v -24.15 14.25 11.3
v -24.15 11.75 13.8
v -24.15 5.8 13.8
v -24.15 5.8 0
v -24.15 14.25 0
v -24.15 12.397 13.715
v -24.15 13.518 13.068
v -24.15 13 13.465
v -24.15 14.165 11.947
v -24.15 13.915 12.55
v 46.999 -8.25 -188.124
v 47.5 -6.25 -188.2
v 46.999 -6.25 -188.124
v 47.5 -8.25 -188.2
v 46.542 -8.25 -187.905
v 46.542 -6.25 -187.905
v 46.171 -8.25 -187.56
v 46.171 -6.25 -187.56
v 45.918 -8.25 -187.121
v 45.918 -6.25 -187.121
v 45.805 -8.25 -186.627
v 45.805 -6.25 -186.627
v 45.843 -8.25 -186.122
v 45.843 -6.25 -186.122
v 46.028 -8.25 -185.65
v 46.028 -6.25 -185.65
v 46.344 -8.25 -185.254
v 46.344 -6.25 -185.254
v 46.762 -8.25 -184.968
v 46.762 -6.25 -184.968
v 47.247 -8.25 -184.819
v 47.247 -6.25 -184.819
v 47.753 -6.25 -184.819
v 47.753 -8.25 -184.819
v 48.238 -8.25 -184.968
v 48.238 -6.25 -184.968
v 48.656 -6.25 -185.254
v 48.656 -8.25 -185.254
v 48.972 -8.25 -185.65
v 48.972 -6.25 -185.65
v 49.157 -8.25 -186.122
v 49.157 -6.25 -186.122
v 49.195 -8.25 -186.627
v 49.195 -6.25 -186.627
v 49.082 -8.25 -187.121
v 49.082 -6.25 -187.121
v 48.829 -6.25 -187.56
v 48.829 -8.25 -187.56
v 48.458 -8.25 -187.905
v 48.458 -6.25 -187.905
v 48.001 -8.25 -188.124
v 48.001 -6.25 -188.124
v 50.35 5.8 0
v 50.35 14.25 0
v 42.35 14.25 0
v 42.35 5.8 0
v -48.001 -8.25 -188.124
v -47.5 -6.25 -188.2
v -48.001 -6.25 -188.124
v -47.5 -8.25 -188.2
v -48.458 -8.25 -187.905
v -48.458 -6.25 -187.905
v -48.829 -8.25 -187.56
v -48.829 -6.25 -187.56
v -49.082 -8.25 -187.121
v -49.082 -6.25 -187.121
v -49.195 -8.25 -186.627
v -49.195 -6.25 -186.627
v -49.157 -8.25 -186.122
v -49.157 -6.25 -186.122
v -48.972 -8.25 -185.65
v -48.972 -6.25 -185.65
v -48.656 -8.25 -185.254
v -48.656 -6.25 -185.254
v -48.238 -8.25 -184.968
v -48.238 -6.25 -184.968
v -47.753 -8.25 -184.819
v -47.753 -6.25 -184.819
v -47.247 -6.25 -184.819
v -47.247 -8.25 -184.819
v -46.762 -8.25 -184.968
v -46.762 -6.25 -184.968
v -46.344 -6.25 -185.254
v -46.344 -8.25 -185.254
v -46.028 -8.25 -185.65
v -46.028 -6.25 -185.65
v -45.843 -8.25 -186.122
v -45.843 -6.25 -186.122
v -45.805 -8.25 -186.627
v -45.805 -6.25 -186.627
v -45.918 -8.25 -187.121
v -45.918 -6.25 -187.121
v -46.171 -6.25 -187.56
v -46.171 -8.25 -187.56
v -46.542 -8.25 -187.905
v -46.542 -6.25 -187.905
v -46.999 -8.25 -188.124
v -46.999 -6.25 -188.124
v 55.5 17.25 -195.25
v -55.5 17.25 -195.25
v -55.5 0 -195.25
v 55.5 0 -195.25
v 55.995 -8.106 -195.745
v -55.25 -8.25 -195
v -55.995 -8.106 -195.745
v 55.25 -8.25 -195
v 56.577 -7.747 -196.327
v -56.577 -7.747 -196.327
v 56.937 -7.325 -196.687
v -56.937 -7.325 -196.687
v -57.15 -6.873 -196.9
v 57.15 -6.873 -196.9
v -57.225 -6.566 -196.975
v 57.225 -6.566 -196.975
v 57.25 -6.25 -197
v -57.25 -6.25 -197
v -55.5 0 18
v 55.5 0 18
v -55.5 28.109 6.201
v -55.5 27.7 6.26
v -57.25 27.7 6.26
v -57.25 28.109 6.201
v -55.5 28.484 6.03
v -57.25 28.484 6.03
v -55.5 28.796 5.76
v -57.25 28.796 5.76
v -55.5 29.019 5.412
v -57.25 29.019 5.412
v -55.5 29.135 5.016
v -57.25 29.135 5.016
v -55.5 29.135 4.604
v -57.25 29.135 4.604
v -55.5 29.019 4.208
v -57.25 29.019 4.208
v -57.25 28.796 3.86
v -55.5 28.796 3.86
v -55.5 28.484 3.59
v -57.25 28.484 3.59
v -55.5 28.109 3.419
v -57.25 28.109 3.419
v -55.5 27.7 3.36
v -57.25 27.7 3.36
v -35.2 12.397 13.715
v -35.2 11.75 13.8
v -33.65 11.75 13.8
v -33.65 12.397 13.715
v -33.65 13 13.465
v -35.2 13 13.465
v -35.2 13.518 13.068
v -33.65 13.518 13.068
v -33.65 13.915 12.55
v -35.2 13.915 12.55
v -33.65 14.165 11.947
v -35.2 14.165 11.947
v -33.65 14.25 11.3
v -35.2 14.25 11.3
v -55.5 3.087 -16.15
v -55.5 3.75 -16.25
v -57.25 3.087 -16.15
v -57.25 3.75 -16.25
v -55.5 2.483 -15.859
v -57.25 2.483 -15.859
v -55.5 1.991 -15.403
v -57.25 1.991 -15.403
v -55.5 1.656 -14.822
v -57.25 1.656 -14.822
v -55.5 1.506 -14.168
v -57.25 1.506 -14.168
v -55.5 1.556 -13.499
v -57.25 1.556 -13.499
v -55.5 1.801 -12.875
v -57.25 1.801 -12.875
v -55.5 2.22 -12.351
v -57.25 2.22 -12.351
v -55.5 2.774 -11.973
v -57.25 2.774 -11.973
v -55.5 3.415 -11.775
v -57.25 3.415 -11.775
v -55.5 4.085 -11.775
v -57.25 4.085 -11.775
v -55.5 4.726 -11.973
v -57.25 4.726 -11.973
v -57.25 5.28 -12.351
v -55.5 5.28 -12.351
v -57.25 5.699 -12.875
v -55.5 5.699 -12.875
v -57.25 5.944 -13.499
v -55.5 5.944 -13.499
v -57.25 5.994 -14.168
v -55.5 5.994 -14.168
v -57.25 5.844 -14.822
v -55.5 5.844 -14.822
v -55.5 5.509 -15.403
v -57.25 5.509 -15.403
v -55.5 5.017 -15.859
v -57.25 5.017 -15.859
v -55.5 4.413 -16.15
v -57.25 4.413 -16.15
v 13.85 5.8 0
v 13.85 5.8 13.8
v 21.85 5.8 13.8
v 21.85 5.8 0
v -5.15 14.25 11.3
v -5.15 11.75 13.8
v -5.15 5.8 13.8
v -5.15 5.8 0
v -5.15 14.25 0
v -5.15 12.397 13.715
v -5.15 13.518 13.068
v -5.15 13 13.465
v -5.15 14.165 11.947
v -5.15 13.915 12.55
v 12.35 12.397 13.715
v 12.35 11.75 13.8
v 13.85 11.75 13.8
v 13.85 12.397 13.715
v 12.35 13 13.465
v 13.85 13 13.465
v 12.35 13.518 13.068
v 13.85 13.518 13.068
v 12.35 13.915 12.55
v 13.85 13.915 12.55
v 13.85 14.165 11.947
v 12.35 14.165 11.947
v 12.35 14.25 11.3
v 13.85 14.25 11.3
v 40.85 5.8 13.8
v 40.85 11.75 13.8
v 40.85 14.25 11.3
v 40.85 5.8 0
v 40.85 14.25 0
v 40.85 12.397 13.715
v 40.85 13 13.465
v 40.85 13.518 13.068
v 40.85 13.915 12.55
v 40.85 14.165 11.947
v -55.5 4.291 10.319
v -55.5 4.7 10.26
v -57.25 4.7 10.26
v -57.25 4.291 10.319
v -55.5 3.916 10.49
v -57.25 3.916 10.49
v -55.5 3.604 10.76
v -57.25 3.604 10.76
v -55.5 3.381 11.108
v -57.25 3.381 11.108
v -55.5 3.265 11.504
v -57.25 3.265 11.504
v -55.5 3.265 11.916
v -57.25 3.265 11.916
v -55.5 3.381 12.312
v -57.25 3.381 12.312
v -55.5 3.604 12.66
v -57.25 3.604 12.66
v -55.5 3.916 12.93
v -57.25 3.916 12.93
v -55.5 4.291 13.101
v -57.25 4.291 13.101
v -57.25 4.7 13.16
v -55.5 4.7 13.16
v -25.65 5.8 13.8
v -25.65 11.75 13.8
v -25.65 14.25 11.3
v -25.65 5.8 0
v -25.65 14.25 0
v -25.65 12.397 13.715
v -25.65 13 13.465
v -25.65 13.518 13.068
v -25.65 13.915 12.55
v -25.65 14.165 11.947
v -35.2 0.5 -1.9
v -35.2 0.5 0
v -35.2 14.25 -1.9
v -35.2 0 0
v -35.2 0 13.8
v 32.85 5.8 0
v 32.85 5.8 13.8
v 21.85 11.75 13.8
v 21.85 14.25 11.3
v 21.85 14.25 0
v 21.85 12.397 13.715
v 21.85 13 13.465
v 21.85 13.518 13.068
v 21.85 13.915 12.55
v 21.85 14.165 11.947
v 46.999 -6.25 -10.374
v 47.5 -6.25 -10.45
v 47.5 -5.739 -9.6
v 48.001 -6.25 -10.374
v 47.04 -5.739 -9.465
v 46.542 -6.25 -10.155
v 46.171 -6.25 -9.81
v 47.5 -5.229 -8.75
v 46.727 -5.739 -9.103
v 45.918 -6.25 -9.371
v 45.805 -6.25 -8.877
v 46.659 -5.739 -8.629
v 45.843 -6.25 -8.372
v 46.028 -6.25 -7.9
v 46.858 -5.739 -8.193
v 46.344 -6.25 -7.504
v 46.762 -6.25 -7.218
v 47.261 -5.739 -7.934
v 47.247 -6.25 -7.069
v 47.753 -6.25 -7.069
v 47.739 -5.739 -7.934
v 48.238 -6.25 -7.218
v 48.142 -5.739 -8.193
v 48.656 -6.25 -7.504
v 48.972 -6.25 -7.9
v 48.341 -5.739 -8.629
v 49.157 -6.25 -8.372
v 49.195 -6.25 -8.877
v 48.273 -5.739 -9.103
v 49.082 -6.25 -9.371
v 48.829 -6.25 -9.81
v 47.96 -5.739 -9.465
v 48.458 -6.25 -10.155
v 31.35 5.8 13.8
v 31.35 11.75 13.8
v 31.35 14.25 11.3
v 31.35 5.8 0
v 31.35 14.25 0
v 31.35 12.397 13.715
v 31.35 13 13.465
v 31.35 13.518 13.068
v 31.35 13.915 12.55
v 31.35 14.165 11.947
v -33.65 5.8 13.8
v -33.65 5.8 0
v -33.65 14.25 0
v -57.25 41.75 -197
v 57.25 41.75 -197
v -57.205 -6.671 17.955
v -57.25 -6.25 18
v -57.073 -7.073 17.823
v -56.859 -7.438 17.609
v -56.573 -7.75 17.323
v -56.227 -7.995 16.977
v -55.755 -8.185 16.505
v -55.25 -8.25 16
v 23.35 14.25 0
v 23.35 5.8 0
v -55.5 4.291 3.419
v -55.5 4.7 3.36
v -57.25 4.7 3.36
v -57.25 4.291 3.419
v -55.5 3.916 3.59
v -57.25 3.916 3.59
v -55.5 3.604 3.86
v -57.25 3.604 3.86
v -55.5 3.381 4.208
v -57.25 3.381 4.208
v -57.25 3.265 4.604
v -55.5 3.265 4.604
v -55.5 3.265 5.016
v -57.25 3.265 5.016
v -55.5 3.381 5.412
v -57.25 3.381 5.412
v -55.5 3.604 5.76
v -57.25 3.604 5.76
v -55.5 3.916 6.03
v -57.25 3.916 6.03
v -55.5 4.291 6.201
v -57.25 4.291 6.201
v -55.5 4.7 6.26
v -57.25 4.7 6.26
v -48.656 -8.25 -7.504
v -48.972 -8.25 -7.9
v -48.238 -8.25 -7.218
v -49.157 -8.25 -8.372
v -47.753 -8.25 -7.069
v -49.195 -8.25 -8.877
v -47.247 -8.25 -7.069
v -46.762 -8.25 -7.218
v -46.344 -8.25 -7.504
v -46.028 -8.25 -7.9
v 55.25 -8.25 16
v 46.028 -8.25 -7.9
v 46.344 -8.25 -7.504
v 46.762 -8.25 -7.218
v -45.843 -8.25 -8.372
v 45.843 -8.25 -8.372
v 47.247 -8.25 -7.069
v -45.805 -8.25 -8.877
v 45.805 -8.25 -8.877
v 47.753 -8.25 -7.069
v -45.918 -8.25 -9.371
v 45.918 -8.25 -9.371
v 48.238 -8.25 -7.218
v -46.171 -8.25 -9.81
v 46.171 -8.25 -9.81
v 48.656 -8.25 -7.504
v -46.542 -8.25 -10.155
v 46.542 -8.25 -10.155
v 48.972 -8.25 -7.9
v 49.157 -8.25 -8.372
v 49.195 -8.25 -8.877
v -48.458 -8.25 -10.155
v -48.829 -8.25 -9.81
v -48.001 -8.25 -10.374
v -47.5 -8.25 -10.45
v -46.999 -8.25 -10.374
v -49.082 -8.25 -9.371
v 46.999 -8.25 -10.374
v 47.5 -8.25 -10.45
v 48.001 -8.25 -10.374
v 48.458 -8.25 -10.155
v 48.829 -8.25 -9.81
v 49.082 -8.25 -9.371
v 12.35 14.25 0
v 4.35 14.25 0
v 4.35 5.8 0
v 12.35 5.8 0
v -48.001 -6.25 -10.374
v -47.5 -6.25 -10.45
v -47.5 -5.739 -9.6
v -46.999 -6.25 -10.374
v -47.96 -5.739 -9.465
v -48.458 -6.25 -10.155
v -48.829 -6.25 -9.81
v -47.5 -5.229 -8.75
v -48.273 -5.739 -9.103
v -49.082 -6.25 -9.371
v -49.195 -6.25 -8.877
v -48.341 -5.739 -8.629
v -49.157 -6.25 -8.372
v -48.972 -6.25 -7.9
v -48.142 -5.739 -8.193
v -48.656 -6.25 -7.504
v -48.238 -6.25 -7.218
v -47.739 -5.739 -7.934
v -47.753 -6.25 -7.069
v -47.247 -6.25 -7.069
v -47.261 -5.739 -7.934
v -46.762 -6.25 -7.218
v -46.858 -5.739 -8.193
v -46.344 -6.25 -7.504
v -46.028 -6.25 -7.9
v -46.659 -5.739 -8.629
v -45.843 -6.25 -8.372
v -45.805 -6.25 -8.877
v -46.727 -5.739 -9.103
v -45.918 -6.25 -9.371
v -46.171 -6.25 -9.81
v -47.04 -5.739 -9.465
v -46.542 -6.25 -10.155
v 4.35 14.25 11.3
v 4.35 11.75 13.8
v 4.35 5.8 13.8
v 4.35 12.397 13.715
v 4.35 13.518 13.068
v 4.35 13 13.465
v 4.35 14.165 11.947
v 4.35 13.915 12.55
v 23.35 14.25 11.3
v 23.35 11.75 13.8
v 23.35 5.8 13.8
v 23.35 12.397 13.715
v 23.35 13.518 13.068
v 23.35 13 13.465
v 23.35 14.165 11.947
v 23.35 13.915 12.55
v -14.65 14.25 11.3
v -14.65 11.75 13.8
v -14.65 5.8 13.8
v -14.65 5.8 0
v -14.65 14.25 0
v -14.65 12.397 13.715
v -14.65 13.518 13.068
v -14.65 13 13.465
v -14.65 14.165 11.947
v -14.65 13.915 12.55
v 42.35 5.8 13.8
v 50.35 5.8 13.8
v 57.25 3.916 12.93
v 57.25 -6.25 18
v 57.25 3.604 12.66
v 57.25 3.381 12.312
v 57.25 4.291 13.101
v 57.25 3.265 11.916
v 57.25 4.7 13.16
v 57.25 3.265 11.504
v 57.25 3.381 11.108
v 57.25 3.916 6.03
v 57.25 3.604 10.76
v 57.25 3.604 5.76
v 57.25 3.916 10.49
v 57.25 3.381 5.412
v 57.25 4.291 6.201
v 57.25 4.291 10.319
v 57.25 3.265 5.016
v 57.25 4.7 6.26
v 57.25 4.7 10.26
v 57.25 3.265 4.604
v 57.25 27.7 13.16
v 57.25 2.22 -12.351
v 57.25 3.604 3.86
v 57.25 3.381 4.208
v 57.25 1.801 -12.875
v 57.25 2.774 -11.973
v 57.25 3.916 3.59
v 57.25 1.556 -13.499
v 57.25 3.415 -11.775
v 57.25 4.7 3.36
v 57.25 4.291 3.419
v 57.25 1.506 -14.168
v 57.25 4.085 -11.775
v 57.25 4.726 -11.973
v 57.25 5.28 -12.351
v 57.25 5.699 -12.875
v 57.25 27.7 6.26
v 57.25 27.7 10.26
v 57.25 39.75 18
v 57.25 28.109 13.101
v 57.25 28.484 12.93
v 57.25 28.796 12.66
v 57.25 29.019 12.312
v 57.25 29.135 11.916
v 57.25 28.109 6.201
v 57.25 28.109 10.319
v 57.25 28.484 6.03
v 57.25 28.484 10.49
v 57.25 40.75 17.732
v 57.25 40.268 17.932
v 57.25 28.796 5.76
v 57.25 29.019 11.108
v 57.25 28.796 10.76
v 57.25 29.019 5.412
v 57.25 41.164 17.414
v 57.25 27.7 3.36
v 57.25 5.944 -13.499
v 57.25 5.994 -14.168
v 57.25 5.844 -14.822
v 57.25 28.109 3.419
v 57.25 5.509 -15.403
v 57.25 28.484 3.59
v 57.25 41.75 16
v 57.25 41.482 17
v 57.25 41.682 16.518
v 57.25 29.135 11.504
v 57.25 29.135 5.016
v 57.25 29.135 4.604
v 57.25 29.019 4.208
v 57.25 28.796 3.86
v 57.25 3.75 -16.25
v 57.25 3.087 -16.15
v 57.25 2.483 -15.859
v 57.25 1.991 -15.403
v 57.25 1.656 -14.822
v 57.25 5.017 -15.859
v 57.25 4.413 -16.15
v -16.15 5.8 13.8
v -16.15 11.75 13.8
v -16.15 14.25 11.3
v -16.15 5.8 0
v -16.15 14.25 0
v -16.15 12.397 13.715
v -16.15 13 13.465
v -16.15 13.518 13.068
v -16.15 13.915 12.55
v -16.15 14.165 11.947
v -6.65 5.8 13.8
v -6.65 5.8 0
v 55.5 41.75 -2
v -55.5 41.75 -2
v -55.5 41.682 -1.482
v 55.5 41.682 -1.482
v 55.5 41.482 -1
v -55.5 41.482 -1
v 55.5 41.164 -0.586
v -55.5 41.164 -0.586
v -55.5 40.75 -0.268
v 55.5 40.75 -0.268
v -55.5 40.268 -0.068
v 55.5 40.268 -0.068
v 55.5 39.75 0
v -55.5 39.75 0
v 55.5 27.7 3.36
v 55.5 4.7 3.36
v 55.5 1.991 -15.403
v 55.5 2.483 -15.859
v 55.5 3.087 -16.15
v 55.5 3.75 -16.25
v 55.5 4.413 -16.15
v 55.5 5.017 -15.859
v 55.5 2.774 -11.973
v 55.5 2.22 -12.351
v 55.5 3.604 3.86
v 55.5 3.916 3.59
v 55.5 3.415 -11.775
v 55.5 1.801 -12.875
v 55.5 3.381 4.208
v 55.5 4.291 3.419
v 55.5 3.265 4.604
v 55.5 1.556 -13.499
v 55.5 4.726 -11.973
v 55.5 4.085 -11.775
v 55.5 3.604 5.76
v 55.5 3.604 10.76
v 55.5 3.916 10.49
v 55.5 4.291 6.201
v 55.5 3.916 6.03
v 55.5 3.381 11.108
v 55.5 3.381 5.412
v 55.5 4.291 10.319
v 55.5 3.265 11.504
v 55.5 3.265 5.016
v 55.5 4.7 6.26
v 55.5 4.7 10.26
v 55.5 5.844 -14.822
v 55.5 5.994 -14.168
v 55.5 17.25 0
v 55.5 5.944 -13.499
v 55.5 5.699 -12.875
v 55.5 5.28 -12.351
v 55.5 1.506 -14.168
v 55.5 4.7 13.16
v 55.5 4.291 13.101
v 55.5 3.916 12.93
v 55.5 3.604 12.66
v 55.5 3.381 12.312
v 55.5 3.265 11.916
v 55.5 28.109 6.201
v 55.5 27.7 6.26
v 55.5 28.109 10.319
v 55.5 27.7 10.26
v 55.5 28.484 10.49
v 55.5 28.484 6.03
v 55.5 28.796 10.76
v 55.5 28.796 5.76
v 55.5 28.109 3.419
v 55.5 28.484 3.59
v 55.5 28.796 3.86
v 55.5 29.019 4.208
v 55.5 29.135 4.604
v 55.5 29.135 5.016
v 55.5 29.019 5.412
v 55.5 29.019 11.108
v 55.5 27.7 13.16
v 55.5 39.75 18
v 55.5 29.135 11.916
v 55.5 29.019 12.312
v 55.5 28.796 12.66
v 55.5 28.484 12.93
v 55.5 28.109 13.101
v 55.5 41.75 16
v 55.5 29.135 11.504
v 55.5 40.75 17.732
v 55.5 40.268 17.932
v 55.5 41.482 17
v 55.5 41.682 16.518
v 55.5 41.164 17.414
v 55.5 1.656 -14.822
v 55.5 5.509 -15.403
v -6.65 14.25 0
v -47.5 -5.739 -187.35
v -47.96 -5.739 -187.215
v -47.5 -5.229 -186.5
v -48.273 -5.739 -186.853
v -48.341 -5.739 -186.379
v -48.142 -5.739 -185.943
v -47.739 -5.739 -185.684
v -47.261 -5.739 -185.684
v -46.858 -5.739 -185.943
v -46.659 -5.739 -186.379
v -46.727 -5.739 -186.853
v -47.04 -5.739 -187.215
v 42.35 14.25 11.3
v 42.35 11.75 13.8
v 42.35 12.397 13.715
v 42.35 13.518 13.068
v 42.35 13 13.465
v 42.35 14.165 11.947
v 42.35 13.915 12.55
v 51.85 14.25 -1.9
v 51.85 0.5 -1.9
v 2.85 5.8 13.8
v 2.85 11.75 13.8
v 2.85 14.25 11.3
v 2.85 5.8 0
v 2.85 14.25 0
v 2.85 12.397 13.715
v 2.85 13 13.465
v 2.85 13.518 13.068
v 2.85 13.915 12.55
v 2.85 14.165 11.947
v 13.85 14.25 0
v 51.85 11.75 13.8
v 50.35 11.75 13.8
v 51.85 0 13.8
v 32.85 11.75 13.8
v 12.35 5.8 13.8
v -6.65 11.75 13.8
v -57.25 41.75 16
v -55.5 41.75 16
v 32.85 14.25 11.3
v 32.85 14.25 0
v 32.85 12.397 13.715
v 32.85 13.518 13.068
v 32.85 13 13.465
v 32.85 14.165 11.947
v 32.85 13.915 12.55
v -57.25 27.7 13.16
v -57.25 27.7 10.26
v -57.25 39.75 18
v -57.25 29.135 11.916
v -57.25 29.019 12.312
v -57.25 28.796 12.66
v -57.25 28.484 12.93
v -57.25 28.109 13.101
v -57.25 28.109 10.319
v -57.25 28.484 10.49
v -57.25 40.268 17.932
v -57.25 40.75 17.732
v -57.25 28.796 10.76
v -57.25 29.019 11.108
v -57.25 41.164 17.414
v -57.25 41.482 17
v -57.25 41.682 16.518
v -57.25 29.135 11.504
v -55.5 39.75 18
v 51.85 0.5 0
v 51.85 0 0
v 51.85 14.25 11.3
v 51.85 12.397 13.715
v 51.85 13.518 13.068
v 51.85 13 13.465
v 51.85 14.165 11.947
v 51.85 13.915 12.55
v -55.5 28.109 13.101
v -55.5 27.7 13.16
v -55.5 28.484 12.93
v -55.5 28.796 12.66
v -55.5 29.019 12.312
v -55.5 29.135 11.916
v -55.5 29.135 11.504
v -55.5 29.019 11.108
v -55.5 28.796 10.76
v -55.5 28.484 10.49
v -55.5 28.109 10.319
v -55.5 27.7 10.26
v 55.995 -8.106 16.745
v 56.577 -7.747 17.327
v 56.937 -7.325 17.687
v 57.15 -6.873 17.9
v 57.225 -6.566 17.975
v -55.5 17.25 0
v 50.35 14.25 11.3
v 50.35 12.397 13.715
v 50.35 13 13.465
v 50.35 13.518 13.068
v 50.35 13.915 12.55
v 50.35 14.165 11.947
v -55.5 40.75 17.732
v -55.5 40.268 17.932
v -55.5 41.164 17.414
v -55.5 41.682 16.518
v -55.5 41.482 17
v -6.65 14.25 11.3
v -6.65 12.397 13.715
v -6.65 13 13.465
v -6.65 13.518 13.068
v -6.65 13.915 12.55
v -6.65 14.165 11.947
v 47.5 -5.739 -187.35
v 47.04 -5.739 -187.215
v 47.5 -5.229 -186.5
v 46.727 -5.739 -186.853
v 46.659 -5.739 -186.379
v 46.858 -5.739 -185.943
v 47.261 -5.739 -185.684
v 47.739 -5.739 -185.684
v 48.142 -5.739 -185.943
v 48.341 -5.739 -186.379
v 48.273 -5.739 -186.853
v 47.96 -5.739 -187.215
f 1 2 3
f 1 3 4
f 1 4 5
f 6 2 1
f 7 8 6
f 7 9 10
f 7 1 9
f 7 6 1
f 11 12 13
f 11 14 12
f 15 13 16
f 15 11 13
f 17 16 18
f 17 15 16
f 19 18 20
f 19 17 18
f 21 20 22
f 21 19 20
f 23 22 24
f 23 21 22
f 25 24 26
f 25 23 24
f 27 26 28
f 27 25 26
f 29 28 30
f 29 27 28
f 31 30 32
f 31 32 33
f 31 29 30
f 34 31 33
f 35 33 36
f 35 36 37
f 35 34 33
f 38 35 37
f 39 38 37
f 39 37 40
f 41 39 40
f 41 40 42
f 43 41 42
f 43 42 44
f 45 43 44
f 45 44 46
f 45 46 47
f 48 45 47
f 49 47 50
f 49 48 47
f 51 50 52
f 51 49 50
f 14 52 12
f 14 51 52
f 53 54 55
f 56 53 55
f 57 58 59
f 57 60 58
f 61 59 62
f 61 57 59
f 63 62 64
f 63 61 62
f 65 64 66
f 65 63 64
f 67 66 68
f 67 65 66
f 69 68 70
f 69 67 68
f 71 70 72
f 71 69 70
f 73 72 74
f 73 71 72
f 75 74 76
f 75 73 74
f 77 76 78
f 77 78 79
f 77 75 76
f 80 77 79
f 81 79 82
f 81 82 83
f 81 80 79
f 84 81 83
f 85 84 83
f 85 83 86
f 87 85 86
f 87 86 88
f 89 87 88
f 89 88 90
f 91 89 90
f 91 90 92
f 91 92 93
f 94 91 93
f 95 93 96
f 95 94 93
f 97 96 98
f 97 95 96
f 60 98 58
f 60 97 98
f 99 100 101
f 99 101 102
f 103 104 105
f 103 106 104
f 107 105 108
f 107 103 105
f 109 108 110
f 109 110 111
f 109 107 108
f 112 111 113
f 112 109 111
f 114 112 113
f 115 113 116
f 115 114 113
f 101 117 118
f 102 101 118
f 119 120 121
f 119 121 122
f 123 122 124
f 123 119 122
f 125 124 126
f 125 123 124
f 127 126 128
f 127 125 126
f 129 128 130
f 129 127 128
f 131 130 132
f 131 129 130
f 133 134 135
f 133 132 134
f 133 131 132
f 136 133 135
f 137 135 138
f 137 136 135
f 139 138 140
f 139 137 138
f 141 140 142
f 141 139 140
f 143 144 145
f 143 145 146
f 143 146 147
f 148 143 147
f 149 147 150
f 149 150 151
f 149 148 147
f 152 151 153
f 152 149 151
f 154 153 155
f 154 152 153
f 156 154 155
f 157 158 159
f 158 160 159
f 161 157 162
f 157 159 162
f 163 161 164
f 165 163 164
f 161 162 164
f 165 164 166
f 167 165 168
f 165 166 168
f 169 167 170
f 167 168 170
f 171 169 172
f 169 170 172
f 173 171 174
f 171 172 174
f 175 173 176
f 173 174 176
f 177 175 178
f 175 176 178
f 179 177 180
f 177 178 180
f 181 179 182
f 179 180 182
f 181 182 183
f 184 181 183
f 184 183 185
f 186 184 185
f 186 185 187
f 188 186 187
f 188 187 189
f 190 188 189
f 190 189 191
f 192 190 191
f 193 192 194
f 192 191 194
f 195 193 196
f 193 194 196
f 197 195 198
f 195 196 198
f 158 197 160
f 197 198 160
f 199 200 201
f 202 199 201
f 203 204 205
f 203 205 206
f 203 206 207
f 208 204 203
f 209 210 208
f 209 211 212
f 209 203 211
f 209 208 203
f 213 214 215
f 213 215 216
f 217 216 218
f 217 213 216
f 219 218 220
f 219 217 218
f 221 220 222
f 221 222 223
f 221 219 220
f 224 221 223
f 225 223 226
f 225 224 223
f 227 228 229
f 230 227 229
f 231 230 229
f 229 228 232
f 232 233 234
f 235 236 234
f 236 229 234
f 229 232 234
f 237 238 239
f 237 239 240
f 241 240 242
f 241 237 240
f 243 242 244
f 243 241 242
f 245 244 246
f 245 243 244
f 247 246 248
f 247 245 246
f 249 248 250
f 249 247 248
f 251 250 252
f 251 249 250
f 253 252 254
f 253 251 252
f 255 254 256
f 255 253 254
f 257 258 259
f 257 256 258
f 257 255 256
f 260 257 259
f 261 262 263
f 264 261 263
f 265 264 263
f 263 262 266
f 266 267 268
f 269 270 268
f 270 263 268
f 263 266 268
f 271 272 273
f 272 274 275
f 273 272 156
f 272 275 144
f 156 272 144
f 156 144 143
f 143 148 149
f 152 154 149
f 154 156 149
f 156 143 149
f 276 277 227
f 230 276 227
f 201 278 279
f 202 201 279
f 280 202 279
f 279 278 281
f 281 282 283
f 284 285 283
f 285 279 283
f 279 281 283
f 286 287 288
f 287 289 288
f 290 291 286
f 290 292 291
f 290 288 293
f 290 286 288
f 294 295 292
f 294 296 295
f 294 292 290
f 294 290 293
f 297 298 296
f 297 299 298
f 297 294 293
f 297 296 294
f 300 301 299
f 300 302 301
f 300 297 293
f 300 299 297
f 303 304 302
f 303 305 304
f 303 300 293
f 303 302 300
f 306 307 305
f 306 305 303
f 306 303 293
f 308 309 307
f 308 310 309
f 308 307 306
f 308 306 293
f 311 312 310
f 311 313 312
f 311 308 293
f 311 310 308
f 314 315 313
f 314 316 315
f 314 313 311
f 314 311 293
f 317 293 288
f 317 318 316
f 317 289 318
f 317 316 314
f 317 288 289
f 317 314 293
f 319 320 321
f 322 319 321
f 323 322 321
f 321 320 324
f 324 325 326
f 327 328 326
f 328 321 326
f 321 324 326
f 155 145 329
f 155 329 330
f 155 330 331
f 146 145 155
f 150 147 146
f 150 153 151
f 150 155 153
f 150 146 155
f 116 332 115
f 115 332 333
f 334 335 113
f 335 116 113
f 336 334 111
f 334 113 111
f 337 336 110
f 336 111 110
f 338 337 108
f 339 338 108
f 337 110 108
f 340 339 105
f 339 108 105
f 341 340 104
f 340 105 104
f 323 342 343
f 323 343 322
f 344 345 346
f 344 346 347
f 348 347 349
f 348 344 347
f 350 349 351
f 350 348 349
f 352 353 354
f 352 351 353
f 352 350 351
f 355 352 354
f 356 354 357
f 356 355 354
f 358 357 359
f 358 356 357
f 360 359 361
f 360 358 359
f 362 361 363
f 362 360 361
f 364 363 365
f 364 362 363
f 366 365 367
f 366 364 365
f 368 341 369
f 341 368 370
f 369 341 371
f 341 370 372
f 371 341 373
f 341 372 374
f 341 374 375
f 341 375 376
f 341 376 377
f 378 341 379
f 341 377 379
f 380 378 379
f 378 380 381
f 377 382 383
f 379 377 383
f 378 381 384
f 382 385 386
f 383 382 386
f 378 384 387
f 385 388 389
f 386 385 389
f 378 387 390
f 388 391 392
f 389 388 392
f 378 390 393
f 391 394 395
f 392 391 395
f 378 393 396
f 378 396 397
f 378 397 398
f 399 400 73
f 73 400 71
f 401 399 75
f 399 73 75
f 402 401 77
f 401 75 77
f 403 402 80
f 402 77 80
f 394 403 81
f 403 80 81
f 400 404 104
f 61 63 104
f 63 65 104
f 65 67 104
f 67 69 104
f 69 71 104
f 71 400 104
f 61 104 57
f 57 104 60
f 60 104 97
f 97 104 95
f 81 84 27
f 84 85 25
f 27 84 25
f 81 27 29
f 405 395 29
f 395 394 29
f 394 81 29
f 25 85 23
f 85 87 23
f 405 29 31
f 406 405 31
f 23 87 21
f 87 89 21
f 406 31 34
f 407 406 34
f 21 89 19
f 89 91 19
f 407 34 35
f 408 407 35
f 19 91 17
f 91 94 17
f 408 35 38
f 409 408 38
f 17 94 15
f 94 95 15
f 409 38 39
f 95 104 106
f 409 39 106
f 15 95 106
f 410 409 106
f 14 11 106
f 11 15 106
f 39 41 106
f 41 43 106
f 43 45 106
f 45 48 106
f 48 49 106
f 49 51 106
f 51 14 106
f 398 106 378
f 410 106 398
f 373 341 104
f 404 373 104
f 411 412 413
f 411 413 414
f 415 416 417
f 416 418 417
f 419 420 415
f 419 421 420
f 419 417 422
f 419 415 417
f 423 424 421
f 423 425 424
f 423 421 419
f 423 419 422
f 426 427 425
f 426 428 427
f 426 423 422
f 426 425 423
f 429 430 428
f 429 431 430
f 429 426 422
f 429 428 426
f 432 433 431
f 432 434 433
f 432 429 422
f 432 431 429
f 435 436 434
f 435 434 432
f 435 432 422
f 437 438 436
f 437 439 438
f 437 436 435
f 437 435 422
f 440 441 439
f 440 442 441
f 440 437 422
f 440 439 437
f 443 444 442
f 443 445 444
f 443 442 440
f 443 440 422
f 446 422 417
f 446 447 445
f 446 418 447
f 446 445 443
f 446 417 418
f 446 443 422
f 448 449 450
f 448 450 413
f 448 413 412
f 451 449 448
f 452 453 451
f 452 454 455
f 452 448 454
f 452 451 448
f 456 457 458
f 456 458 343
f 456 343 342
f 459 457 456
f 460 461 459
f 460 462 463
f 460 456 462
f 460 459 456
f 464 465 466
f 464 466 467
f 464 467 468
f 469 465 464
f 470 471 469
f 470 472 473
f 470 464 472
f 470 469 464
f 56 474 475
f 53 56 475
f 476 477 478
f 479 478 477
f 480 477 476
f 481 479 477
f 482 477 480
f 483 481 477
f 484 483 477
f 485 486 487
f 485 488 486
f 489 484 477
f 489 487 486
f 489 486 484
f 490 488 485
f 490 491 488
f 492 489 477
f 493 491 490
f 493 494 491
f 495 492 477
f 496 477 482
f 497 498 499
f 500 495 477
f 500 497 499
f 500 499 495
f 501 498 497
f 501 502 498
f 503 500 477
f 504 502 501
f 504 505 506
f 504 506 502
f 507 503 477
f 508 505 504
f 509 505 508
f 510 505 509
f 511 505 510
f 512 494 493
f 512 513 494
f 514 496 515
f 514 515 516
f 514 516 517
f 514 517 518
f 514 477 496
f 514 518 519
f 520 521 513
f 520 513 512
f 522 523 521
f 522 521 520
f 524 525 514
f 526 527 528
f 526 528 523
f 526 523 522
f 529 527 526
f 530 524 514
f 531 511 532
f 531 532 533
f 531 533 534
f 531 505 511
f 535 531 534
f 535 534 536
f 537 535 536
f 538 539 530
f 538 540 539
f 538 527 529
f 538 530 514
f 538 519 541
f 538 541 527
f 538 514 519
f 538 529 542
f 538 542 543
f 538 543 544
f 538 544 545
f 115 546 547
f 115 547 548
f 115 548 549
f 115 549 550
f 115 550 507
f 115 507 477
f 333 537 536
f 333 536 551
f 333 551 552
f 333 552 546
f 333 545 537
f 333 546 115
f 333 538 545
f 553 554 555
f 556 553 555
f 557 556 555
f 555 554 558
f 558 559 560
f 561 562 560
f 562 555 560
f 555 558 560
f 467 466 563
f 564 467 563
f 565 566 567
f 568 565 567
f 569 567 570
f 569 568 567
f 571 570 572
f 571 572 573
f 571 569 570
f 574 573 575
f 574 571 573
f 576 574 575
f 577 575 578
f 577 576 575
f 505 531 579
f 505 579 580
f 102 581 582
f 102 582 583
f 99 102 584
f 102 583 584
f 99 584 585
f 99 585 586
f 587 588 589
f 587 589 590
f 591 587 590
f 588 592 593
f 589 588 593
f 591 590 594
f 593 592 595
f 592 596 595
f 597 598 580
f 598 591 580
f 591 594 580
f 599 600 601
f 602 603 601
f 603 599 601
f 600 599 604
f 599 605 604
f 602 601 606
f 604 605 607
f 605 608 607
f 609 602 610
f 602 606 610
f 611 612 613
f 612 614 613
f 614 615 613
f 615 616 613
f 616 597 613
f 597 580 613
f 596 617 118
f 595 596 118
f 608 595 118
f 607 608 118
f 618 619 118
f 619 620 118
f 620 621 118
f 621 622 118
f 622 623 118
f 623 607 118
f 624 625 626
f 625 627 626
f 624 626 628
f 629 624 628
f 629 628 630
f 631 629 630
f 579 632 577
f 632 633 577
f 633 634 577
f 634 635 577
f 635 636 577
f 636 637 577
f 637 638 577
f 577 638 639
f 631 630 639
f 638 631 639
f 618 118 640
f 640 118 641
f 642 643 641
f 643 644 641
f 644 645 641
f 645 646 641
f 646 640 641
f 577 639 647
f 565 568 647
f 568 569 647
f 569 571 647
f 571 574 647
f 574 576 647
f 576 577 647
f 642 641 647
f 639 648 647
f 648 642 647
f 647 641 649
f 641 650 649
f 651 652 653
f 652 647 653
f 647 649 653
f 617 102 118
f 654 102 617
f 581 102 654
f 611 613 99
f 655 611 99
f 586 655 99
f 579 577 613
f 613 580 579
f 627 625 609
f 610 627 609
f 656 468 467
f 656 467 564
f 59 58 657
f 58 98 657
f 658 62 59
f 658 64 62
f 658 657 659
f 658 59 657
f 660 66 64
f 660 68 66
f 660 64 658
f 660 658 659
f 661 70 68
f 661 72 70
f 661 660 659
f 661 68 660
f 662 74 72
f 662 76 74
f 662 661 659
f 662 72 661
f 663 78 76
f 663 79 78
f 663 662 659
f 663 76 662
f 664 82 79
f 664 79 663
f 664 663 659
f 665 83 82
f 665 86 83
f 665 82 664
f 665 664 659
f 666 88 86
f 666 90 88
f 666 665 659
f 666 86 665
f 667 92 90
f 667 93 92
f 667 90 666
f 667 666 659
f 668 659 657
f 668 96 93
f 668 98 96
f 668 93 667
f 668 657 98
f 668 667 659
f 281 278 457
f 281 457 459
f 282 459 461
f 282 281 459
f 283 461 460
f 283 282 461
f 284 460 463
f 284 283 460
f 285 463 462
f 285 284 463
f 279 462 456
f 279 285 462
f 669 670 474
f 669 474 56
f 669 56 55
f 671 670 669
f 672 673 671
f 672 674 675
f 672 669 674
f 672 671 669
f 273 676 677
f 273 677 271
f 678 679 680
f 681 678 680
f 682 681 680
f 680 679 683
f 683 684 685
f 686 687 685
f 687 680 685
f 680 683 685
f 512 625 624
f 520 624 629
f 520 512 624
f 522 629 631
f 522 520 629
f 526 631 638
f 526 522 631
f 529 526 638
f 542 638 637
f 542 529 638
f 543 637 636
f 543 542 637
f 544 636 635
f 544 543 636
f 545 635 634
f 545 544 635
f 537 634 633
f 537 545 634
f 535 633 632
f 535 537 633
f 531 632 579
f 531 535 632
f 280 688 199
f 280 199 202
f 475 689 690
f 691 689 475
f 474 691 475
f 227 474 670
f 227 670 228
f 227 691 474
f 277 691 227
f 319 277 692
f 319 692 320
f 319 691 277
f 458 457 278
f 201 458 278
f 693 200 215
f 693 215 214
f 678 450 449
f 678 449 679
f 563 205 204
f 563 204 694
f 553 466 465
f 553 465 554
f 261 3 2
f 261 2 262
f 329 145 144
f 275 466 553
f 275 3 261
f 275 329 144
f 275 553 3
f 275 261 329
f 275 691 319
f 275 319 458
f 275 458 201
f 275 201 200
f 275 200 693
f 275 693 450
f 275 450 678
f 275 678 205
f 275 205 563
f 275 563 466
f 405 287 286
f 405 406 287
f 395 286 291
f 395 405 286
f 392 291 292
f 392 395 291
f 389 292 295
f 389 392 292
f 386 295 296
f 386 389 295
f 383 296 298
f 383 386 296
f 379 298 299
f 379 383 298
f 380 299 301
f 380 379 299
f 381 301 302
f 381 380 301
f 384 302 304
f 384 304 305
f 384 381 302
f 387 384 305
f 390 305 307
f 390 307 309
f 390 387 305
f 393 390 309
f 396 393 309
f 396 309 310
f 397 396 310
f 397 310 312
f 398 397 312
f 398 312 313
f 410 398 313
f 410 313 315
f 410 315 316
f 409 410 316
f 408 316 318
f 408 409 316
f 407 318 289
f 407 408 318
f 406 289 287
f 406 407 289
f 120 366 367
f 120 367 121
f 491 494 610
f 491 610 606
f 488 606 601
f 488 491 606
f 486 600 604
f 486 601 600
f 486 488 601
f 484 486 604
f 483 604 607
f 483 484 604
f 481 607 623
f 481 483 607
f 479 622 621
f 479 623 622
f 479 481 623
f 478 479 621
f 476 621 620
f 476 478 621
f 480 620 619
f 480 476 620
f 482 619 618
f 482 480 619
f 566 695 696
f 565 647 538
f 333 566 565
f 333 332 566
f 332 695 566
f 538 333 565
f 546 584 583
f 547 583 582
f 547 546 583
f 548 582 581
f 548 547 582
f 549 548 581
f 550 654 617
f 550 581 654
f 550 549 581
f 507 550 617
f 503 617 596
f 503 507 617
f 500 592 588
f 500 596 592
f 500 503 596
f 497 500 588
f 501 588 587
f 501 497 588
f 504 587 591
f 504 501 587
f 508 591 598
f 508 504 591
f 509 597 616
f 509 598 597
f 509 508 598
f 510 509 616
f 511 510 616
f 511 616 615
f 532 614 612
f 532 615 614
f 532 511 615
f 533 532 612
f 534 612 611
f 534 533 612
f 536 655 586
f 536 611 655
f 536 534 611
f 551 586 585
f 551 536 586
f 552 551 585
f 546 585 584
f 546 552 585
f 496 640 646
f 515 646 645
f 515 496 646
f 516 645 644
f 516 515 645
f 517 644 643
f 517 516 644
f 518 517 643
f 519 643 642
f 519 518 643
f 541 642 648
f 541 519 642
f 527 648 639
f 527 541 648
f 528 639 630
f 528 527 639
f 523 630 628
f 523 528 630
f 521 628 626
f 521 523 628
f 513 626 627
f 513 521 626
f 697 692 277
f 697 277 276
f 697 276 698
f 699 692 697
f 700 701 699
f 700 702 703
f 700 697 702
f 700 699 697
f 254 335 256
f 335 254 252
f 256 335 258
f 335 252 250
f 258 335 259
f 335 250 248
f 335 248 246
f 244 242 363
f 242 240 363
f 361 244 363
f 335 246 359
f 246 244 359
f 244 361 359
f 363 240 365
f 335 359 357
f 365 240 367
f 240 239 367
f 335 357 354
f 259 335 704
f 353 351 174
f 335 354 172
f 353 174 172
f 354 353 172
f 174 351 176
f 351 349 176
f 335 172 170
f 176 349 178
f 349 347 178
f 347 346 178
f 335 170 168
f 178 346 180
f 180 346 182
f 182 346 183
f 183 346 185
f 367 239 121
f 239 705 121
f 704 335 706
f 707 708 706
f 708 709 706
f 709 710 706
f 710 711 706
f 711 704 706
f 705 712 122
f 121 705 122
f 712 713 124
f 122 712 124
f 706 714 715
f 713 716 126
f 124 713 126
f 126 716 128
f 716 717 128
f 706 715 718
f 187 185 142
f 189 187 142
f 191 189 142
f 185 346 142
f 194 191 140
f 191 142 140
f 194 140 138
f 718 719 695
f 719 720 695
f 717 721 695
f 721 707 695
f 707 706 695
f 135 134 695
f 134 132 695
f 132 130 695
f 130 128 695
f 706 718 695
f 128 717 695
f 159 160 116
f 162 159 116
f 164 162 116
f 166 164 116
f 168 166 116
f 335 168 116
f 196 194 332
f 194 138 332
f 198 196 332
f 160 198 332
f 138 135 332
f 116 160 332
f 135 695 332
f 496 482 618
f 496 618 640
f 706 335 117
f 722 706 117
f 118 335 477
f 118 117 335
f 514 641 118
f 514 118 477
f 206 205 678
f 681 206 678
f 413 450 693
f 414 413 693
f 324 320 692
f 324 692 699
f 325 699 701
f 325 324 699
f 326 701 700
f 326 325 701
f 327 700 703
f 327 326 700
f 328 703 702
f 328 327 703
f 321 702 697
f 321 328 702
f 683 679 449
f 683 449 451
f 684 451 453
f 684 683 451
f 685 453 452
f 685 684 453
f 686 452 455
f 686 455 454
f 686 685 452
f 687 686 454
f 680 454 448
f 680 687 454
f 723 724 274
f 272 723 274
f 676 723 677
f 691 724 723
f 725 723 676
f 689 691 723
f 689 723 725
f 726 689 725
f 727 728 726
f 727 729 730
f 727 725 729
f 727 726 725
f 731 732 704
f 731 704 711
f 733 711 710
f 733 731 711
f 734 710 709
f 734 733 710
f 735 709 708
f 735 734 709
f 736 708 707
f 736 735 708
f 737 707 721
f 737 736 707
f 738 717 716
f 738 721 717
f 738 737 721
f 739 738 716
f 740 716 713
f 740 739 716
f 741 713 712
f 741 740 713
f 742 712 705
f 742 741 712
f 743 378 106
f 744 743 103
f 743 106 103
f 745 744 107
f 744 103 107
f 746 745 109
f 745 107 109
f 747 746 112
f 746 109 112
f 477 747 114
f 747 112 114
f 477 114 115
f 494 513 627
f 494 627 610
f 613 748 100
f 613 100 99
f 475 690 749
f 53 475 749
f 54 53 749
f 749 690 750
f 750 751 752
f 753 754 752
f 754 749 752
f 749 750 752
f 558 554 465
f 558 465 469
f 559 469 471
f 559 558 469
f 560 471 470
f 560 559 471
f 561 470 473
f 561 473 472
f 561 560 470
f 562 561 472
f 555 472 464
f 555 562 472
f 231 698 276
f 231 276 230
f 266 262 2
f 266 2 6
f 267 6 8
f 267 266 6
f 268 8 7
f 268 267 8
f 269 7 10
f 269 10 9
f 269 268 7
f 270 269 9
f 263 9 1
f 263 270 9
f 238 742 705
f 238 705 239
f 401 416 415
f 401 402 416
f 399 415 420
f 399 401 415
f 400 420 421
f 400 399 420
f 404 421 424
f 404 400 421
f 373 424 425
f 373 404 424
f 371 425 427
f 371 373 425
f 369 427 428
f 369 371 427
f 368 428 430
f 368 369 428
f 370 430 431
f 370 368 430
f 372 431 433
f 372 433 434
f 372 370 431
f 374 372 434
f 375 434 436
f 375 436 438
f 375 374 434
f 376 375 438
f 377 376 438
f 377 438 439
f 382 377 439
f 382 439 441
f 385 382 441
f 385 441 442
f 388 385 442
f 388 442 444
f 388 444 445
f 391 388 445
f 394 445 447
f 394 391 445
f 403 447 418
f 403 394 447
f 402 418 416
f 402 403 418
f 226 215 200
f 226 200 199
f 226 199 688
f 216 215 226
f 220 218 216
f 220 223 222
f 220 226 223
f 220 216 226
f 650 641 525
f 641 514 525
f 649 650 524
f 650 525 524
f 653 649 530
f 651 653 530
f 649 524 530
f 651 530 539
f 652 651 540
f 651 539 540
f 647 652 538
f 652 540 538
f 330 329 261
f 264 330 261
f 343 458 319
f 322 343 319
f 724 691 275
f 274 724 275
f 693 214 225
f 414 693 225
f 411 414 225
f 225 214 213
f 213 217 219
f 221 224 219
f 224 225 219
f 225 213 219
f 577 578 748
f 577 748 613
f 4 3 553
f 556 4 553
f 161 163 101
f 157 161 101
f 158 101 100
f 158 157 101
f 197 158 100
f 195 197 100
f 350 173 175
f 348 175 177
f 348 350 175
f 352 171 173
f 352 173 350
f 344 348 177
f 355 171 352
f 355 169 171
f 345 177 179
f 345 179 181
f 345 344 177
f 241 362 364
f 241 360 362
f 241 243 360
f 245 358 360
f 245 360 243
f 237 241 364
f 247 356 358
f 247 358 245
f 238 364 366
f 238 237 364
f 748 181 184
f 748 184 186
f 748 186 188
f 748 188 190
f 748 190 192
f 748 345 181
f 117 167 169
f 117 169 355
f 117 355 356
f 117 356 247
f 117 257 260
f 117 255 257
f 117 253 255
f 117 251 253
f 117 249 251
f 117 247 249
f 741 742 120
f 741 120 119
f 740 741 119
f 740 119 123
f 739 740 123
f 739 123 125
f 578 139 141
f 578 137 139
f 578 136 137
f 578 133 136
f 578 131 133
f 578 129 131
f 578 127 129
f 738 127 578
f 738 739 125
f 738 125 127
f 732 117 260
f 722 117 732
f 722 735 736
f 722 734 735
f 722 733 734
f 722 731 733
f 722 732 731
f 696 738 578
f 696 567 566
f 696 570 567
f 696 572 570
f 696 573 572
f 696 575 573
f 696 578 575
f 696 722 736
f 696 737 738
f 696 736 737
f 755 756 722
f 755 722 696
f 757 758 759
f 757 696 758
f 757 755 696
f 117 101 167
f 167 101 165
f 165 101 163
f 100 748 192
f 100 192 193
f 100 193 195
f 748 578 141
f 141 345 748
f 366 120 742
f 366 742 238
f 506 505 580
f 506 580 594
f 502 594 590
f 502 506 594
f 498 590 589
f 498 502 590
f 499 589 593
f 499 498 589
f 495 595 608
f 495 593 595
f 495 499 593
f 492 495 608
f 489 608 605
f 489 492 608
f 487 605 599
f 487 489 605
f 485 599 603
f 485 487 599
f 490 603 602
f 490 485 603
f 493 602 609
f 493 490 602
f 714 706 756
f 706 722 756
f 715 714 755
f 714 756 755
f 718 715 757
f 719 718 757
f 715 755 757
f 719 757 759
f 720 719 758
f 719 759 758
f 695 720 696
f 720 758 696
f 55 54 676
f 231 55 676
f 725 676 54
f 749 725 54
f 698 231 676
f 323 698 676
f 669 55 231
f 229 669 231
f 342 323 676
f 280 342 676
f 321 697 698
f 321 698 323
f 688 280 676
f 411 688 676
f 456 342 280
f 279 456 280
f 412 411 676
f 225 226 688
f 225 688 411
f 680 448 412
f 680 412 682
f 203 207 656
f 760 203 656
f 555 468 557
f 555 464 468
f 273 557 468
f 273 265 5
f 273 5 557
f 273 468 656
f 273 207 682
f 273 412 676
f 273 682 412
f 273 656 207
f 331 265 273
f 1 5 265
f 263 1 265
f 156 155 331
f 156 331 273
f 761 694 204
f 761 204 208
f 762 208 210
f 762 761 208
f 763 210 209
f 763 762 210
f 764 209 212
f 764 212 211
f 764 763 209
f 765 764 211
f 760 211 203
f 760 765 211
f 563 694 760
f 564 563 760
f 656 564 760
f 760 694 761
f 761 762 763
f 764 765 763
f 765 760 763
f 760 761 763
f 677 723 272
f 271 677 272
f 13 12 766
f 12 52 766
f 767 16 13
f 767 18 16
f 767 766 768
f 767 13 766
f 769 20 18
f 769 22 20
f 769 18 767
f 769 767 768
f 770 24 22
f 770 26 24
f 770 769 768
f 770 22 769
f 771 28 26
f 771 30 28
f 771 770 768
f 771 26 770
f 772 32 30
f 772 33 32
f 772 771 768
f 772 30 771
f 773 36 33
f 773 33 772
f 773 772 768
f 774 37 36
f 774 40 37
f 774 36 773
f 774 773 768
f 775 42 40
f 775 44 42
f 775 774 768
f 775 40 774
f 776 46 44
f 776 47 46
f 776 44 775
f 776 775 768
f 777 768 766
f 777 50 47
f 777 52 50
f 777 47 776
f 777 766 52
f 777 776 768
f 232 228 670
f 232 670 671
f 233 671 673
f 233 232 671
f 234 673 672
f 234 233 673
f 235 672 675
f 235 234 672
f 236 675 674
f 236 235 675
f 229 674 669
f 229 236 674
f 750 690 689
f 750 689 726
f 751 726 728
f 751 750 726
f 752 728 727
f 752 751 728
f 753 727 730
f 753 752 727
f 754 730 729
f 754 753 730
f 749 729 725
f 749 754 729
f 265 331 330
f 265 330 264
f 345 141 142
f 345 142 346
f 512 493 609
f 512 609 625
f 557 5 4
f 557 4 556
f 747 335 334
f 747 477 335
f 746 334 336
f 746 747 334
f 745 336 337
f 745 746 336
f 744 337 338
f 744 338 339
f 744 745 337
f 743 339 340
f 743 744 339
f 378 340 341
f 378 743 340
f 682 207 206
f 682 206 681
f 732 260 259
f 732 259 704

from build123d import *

# Parameters (mm, degrees)
SKETCH1_W                     = 114.5
SKETCH1_H                     = 215
BOSS_EXTRUDE1_DEPTH           = 41.75
BOSS_EXTRUDE1_DEPTH_BACK      = 8.25
SKETCH2_W                     = 111
SKETCH2_H                     = 41.75
CUT_EXTRUDE1_DEPTH            = 18
CUT_EXTRUDE2_DEPTH            = 115.5
FILLET1_R                     = 2
SKETCH4_W                     = 87.05
SKETCH4_H                     = 13.8
BOSS_EXTRUDE2_DEPTH           = 14.25
SKETCH7_W                     = 111
SKETCH7_H                     = 17.25
CUT_EXTRUDE4_DEPTH            = 195.25
FILLET2_R                     = 2.5
SKETCH6_W                     = 8
SKETCH6_H                     = 8.45
CUT_EXTRUDE3_DEPTH            = 13.8
SKETCH9_W                     = 87.05
SKETCH9_H                     = 13.75
BOSS_EXTRUDE6_DEPTH           = 1.9
LPATTERN1_COUNT               = 9
LPATTERN1_PITCH               = 9.5
M3_CLEARANCE_HOLE2_AT_2_COUNT = 2
M3_CLEARANCE_HOLE2_AT_2_PITCH = 95
M3_CLEARANCE_HOLE2_AT_3_COUNT = 2
M3_CLEARANCE_HOLE2_AT_3_PITCH = 201.544194905
M3_CLEARANCE_HOLE2_AT_4_COUNT = 2
M3_CLEARANCE_HOLE2_AT_4_PITCH = 177.75


with BuildPart() as part:
    # Sketch1 → Boss-Extrude1 (new body, two sides)
    with BuildSketch(Plane(origin=(0, 0, 0), x_dir=(1, 0, 0), z_dir=(0, 1, 0))) as boss_extrude1_sk:
        with Locations((0, 89.5)):
            Rectangle(SKETCH1_W, SKETCH1_H)
    extrude(amount=BOSS_EXTRUDE1_DEPTH)
    extrude(boss_extrude1_sk.sketch, amount=-BOSS_EXTRUDE1_DEPTH_BACK)

    # Sketch2 → Cut-Extrude1 (cut)
    with BuildSketch(Plane.XY.offset(18)):
        with Locations((0, 20.875)):
            Rectangle(SKETCH2_W, SKETCH2_H)
    extrude(amount=-CUT_EXTRUDE1_DEPTH, mode=Mode.SUBTRACT)

    # Sketch3 → Cut-Extrude2 (cut, through all)
    with BuildSketch(Plane(origin=(57.25, 0, 0), x_dir=(0, 0, -1), z_dir=(1, 0, 0))):
        with BuildLine():
            Line((-10.26, 27.7), (-10.26, 4.7))
            ThreePointArc((-10.26, 4.7), (-11.71, 3.25), (-13.16, 4.7))
            Line((-13.16, 4.7), (-13.16, 27.7))
            ThreePointArc((-13.16, 27.7), (-11.71, 29.15), (-10.26, 27.7))
        make_face()
        with BuildLine():
            Line((-3.36, 27.7), (-3.36, 4.7))
            ThreePointArc((-3.36, 4.7), (-4.81, 3.25), (-6.26, 4.7))
            Line((-6.26, 4.7), (-6.26, 27.7))
            ThreePointArc((-6.26, 27.7), (-4.81, 29.15), (-3.36, 27.7))
        make_face()
    extrude(amount=-CUT_EXTRUDE2_DEPTH, mode=Mode.SUBTRACT)

    # Fillet1
    fillet1_edges = [part.edges().sort_by_distance(p)[0] for p in [
        (57.25, -8.25, -89.5),
        (-56.375, 41.75, 18),
        (0, -8.25, -197),
        (56.375, 41.75, 18),
        (0, 41.75, 0),
        (-57.25, -8.25, -89.5),
        (0, -8.25, 18),
    ]]
    fillet(fillet1_edges, radius=FILLET1_R)

    # Sketch7 → Cut-Extrude4 (cut)
    with BuildSketch(Plane.XY):
        with Locations((0, 8.625)):
            Rectangle(SKETCH7_W, SKETCH7_H)
    extrude(amount=-CUT_EXTRUDE4_DEPTH, mode=Mode.SUBTRACT)

    # Sketch13 → M3 Clearance Hole2 (revolve, cut)
    with BuildSketch(Plane(origin=(-47.5, -8.25, -8.75), x_dir=(0, 0, -1), z_dir=(1, 0, 0))):
        Polygon((0, 0), (0, 3.021463052), (1.7, 2), (1.7, 0), align=None)
    m3_clearance_hole2 = revolve(axis=Axis((-47.5, -14.6, -8.75), (0, 1, 0)), mode=Mode.SUBTRACT)

    # M3 Clearance Hole2 at 2: M3 Clearance Hole2 ×2
    with Locations(*[(i * M3_CLEARANCE_HOLE2_AT_2_PITCH, 0, 0) for i in range(1, M3_CLEARANCE_HOLE2_AT_2_COUNT)]):
        add(m3_clearance_hole2, mode=Mode.SUBTRACT)

    # M3 Clearance Hole2 at 3: M3 Clearance Hole2 ×2
    with Locations(*[Vector(0.471360637, 0, -0.881940559) * (i * M3_CLEARANCE_HOLE2_AT_3_PITCH) for i in range(1, M3_CLEARANCE_HOLE2_AT_3_COUNT)]):
        add(m3_clearance_hole2, mode=Mode.SUBTRACT)

    # M3 Clearance Hole2 at 4: M3 Clearance Hole2 ×2
    with Locations(*[(0, 0, -i * M3_CLEARANCE_HOLE2_AT_4_PITCH) for i in range(1, M3_CLEARANCE_HOLE2_AT_4_COUNT)]):
        add(m3_clearance_hole2, mode=Mode.SUBTRACT)

    # Sketch15 → M4 Clearance Hole1 (revolve, cut)
    with BuildSketch(Plane(origin=(57.25, 3.75, -14), x_dir=(0, 0, -1), z_dir=(0, 1, 0))):
        Polygon((0, 0), (0, 3.351936393), (2.25, 2), (2.25, 0), align=None)
    m4_clearance_hole1 = revolve(axis=Axis((63.6, 3.75, -14), (-1, 0, 0)), mode=Mode.SUBTRACT)

    # M4 Hole Other Side: M4 Clearance Hole1 across plane
    add(m4_clearance_hole1.mirror(Plane(origin=(0, 0, 0), x_dir=(0, 0, 1), z_dir=(1, 0, 0))), mode=Mode.SUBTRACT)


with BuildPart() as body_2:
    # Sketch4 → Boss-Extrude2 (new body)
    with BuildSketch(Plane(origin=(0, 0, 0), x_dir=(-1, 0, 0), z_dir=(0, 1, 0))):
        with Locations((-8.325, 6.9)):
            Rectangle(SKETCH4_W, SKETCH4_H)
    extrude(amount=BOSS_EXTRUDE2_DEPTH)

    # Fillet2
    fillet2_edges = [body_2.edges().sort_by_distance(p)[0] for p in [
        (8.325, 14.25, 13.8),
    ]]
    fillet(fillet2_edges, radius=FILLET2_R)

    # Sketch6 → Cut-Extrude3 (cut)
    with BuildSketch(Plane.XY.offset(13.8)):
        with Locations((46.35, 10.025)):
            Rectangle(SKETCH6_W, SKETCH6_H)
    cut_extrude3 = extrude(amount=-CUT_EXTRUDE3_DEPTH, mode=Mode.SUBTRACT)

    # Sketch9 → Boss-Extrude6 (add)
    with BuildSketch(Plane(origin=(0, 0, 0), x_dir=(-1, 0, 0), z_dir=(0, 0, -1))):
        with Locations((-8.325, 7.375)):
            Rectangle(SKETCH9_W, SKETCH9_H)
    extrude(amount=BOSS_EXTRUDE6_DEPTH)

    # LPattern1: Cut-Extrude3 ×9
    with Locations(*[(-i * LPATTERN1_PITCH, 0, 0) for i in range(1, LPATTERN1_COUNT)]):
        add(cut_extrude3, mode=Mode.SUBTRACT)


solid = Compound([part.part, body_2.part])
